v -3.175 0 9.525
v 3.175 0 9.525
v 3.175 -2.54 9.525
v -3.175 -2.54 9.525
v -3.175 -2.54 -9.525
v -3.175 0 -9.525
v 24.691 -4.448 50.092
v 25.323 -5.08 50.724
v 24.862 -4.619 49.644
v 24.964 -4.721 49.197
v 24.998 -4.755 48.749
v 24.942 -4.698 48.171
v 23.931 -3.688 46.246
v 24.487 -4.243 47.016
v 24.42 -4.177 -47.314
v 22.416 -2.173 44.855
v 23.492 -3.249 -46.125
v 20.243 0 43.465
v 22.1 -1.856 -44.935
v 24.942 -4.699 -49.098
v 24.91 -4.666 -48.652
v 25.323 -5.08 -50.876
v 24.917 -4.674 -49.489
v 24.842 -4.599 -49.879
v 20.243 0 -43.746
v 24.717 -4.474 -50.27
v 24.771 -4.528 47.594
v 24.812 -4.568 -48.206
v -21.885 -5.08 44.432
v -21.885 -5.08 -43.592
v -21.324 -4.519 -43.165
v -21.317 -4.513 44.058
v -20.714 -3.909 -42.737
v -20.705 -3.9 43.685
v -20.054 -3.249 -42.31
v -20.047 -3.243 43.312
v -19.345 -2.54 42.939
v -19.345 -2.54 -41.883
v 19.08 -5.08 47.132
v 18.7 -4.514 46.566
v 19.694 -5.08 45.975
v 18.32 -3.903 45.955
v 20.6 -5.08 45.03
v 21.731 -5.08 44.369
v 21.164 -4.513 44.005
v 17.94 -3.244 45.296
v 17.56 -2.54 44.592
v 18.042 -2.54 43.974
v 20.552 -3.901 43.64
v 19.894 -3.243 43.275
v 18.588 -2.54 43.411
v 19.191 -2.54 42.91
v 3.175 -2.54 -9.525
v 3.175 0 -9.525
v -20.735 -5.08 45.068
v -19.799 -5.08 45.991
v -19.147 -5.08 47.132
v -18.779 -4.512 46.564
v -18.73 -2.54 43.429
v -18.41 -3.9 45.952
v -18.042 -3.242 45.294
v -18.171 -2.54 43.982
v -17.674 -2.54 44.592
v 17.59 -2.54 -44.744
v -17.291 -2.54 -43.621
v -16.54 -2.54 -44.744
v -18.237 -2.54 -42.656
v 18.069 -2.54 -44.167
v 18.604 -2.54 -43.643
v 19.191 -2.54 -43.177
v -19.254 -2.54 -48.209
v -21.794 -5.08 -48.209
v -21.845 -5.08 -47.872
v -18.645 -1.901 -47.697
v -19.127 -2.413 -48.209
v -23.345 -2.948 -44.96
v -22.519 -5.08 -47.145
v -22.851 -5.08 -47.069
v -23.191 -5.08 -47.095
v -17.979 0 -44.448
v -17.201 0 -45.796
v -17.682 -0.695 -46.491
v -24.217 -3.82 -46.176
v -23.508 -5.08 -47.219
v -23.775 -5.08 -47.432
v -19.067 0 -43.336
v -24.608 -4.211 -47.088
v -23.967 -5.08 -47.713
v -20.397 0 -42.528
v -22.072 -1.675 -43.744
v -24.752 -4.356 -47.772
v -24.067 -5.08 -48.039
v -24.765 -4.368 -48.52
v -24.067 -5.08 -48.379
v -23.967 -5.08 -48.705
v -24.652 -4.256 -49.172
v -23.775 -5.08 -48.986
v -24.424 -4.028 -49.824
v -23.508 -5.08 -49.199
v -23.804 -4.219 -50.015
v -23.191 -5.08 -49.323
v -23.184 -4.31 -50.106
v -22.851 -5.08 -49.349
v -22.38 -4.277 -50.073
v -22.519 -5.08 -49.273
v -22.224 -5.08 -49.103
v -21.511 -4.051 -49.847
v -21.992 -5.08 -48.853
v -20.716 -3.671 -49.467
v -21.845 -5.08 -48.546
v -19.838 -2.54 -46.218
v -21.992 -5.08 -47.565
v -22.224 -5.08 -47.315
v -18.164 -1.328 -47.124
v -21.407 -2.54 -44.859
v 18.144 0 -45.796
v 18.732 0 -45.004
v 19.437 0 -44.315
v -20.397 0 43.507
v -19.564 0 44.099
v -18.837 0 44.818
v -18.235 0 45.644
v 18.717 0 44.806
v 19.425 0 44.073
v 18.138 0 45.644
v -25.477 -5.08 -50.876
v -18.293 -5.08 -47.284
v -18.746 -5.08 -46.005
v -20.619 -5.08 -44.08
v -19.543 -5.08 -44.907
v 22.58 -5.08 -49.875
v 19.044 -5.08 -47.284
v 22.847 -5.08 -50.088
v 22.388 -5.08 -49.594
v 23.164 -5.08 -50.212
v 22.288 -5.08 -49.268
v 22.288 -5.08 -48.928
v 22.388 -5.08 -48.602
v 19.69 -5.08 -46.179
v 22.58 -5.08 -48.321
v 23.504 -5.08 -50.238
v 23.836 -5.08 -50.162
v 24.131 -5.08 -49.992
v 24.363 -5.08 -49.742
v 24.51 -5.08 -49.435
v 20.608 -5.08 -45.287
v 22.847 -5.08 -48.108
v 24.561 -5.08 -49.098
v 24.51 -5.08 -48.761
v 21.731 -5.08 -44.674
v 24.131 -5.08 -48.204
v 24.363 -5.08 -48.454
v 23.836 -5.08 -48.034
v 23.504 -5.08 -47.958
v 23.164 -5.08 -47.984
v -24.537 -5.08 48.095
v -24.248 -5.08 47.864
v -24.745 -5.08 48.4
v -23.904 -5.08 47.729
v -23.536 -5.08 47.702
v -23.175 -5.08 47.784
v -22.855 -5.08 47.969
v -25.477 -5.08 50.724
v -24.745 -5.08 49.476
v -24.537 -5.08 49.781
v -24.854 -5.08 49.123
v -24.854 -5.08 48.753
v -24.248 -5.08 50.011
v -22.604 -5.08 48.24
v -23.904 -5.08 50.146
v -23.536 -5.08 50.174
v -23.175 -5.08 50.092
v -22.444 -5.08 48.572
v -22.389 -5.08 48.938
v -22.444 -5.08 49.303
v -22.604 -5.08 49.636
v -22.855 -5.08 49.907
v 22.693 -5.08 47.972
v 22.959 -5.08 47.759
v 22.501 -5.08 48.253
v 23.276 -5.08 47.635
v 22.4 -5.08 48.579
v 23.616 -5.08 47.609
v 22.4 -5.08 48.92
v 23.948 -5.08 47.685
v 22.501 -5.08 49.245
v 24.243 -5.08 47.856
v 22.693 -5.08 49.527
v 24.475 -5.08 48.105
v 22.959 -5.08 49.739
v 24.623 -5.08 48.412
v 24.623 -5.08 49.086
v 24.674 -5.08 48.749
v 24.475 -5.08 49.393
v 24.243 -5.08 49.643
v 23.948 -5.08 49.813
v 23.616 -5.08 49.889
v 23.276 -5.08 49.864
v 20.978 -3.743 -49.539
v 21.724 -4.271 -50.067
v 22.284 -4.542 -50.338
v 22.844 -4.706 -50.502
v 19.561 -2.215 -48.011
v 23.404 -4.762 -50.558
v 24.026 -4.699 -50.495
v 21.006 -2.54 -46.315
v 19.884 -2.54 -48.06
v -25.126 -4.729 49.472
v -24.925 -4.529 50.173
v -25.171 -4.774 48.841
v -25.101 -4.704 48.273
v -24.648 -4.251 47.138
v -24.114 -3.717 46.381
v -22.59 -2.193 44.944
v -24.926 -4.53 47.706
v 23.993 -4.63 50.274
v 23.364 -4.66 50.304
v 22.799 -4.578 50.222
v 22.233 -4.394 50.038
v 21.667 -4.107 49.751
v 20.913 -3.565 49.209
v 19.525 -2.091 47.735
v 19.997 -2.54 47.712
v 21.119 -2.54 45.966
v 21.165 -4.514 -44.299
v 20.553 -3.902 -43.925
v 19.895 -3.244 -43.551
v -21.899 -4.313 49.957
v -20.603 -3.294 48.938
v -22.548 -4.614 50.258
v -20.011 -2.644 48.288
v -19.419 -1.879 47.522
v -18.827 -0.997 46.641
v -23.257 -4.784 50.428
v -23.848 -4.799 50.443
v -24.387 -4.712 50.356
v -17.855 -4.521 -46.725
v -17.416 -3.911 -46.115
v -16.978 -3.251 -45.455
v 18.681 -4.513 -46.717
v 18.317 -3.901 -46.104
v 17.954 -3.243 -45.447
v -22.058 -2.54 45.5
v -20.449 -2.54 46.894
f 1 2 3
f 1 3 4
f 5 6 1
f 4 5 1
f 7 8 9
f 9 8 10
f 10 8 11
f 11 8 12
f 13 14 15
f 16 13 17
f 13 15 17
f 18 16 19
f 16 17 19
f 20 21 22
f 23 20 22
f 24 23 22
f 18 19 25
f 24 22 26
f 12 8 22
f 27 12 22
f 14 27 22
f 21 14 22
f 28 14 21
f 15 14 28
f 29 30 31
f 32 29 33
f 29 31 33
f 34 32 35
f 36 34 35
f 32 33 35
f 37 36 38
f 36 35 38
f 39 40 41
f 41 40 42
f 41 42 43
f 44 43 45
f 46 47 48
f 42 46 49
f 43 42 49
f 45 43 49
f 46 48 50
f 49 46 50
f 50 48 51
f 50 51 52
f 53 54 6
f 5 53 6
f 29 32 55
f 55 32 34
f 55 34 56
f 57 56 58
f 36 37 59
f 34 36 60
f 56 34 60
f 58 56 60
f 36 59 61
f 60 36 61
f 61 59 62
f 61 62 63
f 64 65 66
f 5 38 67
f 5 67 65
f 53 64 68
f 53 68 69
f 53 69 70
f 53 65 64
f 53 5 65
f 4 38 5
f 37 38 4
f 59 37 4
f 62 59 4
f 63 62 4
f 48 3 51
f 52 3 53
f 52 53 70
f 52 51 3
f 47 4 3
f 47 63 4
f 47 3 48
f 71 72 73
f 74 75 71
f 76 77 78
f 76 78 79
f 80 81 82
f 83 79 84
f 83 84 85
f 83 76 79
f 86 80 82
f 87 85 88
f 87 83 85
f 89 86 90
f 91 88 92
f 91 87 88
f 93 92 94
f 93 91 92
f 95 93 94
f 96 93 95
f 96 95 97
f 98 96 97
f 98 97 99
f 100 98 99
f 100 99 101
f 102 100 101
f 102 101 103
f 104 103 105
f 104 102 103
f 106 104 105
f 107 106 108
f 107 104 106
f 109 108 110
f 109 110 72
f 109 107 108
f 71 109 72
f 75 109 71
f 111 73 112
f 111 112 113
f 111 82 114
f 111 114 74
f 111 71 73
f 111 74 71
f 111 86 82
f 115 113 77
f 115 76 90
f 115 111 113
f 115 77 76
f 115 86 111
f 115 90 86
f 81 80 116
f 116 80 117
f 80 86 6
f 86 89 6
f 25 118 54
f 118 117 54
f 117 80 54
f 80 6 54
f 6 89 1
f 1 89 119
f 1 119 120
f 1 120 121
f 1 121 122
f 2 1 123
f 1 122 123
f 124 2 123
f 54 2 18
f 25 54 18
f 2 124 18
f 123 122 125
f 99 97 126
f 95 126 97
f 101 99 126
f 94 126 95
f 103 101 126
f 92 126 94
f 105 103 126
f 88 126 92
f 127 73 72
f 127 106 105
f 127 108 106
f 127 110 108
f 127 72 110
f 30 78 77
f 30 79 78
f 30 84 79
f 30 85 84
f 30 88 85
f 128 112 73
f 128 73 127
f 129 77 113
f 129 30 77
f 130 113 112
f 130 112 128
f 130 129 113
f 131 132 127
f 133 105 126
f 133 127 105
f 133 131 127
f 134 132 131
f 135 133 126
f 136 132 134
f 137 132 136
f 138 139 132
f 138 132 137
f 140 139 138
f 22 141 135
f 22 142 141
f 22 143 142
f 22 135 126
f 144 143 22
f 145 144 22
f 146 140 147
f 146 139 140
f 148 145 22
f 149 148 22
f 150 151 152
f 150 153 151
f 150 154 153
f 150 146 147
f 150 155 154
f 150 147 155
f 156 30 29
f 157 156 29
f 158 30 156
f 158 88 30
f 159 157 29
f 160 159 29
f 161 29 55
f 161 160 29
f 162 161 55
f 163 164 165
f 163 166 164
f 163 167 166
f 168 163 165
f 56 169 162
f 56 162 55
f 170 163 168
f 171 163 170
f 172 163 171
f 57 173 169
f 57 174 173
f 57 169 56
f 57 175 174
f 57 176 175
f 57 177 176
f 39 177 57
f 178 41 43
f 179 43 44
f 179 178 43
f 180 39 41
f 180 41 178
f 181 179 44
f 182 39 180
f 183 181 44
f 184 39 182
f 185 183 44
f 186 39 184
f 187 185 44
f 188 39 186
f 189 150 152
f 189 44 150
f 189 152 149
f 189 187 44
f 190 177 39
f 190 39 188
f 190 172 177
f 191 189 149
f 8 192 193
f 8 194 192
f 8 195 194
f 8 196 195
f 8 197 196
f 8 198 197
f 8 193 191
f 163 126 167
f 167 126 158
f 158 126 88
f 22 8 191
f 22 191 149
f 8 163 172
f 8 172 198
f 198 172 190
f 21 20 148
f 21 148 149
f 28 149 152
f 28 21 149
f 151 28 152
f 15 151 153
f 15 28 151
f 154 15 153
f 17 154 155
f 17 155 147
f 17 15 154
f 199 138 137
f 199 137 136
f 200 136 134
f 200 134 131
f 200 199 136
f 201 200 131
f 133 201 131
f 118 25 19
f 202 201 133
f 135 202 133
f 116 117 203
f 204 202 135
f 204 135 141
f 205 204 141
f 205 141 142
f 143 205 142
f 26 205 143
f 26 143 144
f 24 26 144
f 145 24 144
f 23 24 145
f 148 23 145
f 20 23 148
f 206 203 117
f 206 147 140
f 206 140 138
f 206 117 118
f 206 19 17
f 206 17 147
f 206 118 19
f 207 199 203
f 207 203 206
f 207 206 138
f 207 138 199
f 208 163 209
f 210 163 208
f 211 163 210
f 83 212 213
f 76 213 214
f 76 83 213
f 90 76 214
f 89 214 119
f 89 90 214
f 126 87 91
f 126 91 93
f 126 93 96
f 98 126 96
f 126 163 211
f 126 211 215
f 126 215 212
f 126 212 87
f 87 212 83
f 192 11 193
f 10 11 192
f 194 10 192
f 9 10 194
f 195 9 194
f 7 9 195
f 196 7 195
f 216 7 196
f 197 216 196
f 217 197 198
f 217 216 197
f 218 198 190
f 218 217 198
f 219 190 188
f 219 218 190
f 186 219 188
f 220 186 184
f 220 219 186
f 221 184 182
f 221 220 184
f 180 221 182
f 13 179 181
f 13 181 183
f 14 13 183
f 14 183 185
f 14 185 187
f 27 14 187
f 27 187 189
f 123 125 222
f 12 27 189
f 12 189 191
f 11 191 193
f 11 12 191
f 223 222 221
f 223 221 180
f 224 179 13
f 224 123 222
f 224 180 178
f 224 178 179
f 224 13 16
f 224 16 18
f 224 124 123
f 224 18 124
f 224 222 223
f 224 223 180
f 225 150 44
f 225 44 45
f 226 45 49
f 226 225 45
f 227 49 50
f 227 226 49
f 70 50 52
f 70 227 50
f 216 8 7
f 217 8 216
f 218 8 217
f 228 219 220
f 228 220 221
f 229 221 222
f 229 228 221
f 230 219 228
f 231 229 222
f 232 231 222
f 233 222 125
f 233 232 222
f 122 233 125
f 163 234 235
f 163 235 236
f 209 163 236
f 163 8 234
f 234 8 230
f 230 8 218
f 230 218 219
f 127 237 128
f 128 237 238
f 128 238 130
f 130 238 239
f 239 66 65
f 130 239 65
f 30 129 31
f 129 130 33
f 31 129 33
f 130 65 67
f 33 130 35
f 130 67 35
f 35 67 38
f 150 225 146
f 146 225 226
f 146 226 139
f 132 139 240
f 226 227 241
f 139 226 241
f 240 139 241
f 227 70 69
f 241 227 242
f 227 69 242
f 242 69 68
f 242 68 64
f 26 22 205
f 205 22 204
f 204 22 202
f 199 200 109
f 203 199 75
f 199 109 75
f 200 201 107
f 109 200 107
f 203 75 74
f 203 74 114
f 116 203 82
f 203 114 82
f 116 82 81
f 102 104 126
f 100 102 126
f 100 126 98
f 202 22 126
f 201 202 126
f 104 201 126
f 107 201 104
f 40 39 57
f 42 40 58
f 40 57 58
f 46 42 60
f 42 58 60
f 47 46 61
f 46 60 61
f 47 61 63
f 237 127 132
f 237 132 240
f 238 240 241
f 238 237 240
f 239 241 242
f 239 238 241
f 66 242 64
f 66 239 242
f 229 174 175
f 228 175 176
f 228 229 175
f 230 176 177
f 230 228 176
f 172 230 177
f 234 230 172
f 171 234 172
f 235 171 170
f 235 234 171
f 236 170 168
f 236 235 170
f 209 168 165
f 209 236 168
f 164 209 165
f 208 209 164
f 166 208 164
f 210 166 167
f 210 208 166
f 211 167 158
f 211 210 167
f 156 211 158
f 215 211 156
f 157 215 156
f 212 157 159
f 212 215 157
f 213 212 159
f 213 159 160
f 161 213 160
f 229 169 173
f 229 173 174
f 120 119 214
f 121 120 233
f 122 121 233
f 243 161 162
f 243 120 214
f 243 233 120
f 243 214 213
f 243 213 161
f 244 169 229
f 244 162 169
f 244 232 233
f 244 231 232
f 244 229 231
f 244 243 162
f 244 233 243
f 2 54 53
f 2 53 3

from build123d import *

# Parameters (mm, degrees)
F0_W        = 50.8
F0_H        = 101.6
F0_R        = 1.143
F0_R_2      = 1.2394927364
F1_DEPTH    = 5.08
F2_T1_DEPTH = 127.7282991577
F2_T3_DEPTH = 76.9282991577
F3_T        = -2.54
F4_W        = 6.35
F4_H        = 19.05
F5_DEPTH    = 25.4


# Not quite as in the source:
# - a fillet or chamfer that OpenCascade refuses, or shapes differently, is made with other operations: its cross-section is extruded or revolved along the edge and cut away or added


with BuildPart() as f1:
    # F0 (on Front) → F1 (new body)
    with BuildSketch(Plane.XZ):
        with Locations((-0.076776122, -0.0760140894)):
            Rectangle(F0_W, F0_H)
        with Locations((-22.936776122, -48.2090140894)):
            Circle(F0_R, mode=Mode.SUBTRACT)
        with Locations((23.418223878, -49.0980140894)):
            Circle(F0_R, mode=Mode.SUBTRACT)
        with Locations((-23.6282116387, 48.9378400757)):
            Circle(F0_R_2, mode=Mode.SUBTRACT)
        with Locations((23.5306444928, 48.7492585503)):
            Circle(F0_R, mode=Mode.SUBTRACT)
    extrude(amount=F1_DEPTH)

    # F2: chamfer of 5.08 on 8 edges, made by hand

    # F2_s2 → F2_t1 (cut)
    with BuildSketch(Plane.XY.offset(-63.9401636683)):
        Polygon((25.323223878, -5.08), (20.243223878, 0), (25.323223878, 0), align=None)
        Polygon((-25.476776122, -5.08), (-20.396776122, 0), (-25.476776122, 0), align=None)
    extrude(amount=F2_T1_DEPTH, mode=Mode.SUBTRACT)

    # F2_s4 → F2_t3 (cut)
    with BuildSketch(Plane.YZ.offset(-38.5409257009)):
        Polygon((-5.08, 50.7239859106), (0, 45.6439859106), (0, 50.7239859106), align=None)
        Polygon((-5.08, -50.8760140894), (0, -45.7960140894), (0, -50.8760140894), align=None)
    extrude(amount=F2_T3_DEPTH, mode=Mode.SUBTRACT)

    # F2_s5 → F2_t6 (revolve, cut)
    with BuildSketch(Plane.XY.offset(48.9378400757)):
        Polygon((-22.3887189023, -5.08), (-17.3087189023, 0), (-22.3887189023, 0), align=None)
    revolve(axis=Axis((-23.6282116387, 0, 48.9378400757), (0, -1, 0)), mode=Mode.SUBTRACT)

    # F2_s7 → F2_t8 (revolve, cut)
    with BuildSketch(Plane.XY.offset(48.7492585503)):
        Polygon((24.6736444928, -5.08), (29.7536444928, 0), (24.6736444928, 0), align=None)
    revolve(axis=Axis((23.5306444928, 0, 48.7492585503), (0, -1, 0)), mode=Mode.SUBTRACT)

    # F2_s9 → F2_t10 (revolve, cut)
    with BuildSketch(Plane.XY.offset(-48.2090140894)):
        Polygon((-21.793776122, -5.08), (-16.713776122, 0), (-21.793776122, 0), align=None)
    revolve(axis=Axis((-22.936776122, 0, -48.2090140894), (0, -1, 0)), mode=Mode.SUBTRACT)

    # F2_s11 → F2_t12 (revolve, cut)
    with BuildSketch(Plane.XY.offset(-49.0980140894)):
        Polygon((24.561223878, -5.08), (29.641223878, 0), (24.561223878, 0), align=None)
    revolve(axis=Axis((23.418223878, 0, -49.0980140894), (0, -1, 0)), mode=Mode.SUBTRACT)

    # F3
    f3_openings = [f1.faces().sort_by_distance(p)[0] for p in [
        (-0.074021, -5.08, -0.083441),
    ]]
    offset(amount=F3_T, openings=f3_openings)

    # F4 (on face) → F5 (cut)
    with BuildSketch(Plane(origin=(0, 0, 0), x_dir=(-1, 0, 0), z_dir=(0, 1, 0))):
        Rectangle(F4_W, F4_H)
    extrude(amount=-F5_DEPTH, mode=Mode.SUBTRACT)


solid = f1.part
